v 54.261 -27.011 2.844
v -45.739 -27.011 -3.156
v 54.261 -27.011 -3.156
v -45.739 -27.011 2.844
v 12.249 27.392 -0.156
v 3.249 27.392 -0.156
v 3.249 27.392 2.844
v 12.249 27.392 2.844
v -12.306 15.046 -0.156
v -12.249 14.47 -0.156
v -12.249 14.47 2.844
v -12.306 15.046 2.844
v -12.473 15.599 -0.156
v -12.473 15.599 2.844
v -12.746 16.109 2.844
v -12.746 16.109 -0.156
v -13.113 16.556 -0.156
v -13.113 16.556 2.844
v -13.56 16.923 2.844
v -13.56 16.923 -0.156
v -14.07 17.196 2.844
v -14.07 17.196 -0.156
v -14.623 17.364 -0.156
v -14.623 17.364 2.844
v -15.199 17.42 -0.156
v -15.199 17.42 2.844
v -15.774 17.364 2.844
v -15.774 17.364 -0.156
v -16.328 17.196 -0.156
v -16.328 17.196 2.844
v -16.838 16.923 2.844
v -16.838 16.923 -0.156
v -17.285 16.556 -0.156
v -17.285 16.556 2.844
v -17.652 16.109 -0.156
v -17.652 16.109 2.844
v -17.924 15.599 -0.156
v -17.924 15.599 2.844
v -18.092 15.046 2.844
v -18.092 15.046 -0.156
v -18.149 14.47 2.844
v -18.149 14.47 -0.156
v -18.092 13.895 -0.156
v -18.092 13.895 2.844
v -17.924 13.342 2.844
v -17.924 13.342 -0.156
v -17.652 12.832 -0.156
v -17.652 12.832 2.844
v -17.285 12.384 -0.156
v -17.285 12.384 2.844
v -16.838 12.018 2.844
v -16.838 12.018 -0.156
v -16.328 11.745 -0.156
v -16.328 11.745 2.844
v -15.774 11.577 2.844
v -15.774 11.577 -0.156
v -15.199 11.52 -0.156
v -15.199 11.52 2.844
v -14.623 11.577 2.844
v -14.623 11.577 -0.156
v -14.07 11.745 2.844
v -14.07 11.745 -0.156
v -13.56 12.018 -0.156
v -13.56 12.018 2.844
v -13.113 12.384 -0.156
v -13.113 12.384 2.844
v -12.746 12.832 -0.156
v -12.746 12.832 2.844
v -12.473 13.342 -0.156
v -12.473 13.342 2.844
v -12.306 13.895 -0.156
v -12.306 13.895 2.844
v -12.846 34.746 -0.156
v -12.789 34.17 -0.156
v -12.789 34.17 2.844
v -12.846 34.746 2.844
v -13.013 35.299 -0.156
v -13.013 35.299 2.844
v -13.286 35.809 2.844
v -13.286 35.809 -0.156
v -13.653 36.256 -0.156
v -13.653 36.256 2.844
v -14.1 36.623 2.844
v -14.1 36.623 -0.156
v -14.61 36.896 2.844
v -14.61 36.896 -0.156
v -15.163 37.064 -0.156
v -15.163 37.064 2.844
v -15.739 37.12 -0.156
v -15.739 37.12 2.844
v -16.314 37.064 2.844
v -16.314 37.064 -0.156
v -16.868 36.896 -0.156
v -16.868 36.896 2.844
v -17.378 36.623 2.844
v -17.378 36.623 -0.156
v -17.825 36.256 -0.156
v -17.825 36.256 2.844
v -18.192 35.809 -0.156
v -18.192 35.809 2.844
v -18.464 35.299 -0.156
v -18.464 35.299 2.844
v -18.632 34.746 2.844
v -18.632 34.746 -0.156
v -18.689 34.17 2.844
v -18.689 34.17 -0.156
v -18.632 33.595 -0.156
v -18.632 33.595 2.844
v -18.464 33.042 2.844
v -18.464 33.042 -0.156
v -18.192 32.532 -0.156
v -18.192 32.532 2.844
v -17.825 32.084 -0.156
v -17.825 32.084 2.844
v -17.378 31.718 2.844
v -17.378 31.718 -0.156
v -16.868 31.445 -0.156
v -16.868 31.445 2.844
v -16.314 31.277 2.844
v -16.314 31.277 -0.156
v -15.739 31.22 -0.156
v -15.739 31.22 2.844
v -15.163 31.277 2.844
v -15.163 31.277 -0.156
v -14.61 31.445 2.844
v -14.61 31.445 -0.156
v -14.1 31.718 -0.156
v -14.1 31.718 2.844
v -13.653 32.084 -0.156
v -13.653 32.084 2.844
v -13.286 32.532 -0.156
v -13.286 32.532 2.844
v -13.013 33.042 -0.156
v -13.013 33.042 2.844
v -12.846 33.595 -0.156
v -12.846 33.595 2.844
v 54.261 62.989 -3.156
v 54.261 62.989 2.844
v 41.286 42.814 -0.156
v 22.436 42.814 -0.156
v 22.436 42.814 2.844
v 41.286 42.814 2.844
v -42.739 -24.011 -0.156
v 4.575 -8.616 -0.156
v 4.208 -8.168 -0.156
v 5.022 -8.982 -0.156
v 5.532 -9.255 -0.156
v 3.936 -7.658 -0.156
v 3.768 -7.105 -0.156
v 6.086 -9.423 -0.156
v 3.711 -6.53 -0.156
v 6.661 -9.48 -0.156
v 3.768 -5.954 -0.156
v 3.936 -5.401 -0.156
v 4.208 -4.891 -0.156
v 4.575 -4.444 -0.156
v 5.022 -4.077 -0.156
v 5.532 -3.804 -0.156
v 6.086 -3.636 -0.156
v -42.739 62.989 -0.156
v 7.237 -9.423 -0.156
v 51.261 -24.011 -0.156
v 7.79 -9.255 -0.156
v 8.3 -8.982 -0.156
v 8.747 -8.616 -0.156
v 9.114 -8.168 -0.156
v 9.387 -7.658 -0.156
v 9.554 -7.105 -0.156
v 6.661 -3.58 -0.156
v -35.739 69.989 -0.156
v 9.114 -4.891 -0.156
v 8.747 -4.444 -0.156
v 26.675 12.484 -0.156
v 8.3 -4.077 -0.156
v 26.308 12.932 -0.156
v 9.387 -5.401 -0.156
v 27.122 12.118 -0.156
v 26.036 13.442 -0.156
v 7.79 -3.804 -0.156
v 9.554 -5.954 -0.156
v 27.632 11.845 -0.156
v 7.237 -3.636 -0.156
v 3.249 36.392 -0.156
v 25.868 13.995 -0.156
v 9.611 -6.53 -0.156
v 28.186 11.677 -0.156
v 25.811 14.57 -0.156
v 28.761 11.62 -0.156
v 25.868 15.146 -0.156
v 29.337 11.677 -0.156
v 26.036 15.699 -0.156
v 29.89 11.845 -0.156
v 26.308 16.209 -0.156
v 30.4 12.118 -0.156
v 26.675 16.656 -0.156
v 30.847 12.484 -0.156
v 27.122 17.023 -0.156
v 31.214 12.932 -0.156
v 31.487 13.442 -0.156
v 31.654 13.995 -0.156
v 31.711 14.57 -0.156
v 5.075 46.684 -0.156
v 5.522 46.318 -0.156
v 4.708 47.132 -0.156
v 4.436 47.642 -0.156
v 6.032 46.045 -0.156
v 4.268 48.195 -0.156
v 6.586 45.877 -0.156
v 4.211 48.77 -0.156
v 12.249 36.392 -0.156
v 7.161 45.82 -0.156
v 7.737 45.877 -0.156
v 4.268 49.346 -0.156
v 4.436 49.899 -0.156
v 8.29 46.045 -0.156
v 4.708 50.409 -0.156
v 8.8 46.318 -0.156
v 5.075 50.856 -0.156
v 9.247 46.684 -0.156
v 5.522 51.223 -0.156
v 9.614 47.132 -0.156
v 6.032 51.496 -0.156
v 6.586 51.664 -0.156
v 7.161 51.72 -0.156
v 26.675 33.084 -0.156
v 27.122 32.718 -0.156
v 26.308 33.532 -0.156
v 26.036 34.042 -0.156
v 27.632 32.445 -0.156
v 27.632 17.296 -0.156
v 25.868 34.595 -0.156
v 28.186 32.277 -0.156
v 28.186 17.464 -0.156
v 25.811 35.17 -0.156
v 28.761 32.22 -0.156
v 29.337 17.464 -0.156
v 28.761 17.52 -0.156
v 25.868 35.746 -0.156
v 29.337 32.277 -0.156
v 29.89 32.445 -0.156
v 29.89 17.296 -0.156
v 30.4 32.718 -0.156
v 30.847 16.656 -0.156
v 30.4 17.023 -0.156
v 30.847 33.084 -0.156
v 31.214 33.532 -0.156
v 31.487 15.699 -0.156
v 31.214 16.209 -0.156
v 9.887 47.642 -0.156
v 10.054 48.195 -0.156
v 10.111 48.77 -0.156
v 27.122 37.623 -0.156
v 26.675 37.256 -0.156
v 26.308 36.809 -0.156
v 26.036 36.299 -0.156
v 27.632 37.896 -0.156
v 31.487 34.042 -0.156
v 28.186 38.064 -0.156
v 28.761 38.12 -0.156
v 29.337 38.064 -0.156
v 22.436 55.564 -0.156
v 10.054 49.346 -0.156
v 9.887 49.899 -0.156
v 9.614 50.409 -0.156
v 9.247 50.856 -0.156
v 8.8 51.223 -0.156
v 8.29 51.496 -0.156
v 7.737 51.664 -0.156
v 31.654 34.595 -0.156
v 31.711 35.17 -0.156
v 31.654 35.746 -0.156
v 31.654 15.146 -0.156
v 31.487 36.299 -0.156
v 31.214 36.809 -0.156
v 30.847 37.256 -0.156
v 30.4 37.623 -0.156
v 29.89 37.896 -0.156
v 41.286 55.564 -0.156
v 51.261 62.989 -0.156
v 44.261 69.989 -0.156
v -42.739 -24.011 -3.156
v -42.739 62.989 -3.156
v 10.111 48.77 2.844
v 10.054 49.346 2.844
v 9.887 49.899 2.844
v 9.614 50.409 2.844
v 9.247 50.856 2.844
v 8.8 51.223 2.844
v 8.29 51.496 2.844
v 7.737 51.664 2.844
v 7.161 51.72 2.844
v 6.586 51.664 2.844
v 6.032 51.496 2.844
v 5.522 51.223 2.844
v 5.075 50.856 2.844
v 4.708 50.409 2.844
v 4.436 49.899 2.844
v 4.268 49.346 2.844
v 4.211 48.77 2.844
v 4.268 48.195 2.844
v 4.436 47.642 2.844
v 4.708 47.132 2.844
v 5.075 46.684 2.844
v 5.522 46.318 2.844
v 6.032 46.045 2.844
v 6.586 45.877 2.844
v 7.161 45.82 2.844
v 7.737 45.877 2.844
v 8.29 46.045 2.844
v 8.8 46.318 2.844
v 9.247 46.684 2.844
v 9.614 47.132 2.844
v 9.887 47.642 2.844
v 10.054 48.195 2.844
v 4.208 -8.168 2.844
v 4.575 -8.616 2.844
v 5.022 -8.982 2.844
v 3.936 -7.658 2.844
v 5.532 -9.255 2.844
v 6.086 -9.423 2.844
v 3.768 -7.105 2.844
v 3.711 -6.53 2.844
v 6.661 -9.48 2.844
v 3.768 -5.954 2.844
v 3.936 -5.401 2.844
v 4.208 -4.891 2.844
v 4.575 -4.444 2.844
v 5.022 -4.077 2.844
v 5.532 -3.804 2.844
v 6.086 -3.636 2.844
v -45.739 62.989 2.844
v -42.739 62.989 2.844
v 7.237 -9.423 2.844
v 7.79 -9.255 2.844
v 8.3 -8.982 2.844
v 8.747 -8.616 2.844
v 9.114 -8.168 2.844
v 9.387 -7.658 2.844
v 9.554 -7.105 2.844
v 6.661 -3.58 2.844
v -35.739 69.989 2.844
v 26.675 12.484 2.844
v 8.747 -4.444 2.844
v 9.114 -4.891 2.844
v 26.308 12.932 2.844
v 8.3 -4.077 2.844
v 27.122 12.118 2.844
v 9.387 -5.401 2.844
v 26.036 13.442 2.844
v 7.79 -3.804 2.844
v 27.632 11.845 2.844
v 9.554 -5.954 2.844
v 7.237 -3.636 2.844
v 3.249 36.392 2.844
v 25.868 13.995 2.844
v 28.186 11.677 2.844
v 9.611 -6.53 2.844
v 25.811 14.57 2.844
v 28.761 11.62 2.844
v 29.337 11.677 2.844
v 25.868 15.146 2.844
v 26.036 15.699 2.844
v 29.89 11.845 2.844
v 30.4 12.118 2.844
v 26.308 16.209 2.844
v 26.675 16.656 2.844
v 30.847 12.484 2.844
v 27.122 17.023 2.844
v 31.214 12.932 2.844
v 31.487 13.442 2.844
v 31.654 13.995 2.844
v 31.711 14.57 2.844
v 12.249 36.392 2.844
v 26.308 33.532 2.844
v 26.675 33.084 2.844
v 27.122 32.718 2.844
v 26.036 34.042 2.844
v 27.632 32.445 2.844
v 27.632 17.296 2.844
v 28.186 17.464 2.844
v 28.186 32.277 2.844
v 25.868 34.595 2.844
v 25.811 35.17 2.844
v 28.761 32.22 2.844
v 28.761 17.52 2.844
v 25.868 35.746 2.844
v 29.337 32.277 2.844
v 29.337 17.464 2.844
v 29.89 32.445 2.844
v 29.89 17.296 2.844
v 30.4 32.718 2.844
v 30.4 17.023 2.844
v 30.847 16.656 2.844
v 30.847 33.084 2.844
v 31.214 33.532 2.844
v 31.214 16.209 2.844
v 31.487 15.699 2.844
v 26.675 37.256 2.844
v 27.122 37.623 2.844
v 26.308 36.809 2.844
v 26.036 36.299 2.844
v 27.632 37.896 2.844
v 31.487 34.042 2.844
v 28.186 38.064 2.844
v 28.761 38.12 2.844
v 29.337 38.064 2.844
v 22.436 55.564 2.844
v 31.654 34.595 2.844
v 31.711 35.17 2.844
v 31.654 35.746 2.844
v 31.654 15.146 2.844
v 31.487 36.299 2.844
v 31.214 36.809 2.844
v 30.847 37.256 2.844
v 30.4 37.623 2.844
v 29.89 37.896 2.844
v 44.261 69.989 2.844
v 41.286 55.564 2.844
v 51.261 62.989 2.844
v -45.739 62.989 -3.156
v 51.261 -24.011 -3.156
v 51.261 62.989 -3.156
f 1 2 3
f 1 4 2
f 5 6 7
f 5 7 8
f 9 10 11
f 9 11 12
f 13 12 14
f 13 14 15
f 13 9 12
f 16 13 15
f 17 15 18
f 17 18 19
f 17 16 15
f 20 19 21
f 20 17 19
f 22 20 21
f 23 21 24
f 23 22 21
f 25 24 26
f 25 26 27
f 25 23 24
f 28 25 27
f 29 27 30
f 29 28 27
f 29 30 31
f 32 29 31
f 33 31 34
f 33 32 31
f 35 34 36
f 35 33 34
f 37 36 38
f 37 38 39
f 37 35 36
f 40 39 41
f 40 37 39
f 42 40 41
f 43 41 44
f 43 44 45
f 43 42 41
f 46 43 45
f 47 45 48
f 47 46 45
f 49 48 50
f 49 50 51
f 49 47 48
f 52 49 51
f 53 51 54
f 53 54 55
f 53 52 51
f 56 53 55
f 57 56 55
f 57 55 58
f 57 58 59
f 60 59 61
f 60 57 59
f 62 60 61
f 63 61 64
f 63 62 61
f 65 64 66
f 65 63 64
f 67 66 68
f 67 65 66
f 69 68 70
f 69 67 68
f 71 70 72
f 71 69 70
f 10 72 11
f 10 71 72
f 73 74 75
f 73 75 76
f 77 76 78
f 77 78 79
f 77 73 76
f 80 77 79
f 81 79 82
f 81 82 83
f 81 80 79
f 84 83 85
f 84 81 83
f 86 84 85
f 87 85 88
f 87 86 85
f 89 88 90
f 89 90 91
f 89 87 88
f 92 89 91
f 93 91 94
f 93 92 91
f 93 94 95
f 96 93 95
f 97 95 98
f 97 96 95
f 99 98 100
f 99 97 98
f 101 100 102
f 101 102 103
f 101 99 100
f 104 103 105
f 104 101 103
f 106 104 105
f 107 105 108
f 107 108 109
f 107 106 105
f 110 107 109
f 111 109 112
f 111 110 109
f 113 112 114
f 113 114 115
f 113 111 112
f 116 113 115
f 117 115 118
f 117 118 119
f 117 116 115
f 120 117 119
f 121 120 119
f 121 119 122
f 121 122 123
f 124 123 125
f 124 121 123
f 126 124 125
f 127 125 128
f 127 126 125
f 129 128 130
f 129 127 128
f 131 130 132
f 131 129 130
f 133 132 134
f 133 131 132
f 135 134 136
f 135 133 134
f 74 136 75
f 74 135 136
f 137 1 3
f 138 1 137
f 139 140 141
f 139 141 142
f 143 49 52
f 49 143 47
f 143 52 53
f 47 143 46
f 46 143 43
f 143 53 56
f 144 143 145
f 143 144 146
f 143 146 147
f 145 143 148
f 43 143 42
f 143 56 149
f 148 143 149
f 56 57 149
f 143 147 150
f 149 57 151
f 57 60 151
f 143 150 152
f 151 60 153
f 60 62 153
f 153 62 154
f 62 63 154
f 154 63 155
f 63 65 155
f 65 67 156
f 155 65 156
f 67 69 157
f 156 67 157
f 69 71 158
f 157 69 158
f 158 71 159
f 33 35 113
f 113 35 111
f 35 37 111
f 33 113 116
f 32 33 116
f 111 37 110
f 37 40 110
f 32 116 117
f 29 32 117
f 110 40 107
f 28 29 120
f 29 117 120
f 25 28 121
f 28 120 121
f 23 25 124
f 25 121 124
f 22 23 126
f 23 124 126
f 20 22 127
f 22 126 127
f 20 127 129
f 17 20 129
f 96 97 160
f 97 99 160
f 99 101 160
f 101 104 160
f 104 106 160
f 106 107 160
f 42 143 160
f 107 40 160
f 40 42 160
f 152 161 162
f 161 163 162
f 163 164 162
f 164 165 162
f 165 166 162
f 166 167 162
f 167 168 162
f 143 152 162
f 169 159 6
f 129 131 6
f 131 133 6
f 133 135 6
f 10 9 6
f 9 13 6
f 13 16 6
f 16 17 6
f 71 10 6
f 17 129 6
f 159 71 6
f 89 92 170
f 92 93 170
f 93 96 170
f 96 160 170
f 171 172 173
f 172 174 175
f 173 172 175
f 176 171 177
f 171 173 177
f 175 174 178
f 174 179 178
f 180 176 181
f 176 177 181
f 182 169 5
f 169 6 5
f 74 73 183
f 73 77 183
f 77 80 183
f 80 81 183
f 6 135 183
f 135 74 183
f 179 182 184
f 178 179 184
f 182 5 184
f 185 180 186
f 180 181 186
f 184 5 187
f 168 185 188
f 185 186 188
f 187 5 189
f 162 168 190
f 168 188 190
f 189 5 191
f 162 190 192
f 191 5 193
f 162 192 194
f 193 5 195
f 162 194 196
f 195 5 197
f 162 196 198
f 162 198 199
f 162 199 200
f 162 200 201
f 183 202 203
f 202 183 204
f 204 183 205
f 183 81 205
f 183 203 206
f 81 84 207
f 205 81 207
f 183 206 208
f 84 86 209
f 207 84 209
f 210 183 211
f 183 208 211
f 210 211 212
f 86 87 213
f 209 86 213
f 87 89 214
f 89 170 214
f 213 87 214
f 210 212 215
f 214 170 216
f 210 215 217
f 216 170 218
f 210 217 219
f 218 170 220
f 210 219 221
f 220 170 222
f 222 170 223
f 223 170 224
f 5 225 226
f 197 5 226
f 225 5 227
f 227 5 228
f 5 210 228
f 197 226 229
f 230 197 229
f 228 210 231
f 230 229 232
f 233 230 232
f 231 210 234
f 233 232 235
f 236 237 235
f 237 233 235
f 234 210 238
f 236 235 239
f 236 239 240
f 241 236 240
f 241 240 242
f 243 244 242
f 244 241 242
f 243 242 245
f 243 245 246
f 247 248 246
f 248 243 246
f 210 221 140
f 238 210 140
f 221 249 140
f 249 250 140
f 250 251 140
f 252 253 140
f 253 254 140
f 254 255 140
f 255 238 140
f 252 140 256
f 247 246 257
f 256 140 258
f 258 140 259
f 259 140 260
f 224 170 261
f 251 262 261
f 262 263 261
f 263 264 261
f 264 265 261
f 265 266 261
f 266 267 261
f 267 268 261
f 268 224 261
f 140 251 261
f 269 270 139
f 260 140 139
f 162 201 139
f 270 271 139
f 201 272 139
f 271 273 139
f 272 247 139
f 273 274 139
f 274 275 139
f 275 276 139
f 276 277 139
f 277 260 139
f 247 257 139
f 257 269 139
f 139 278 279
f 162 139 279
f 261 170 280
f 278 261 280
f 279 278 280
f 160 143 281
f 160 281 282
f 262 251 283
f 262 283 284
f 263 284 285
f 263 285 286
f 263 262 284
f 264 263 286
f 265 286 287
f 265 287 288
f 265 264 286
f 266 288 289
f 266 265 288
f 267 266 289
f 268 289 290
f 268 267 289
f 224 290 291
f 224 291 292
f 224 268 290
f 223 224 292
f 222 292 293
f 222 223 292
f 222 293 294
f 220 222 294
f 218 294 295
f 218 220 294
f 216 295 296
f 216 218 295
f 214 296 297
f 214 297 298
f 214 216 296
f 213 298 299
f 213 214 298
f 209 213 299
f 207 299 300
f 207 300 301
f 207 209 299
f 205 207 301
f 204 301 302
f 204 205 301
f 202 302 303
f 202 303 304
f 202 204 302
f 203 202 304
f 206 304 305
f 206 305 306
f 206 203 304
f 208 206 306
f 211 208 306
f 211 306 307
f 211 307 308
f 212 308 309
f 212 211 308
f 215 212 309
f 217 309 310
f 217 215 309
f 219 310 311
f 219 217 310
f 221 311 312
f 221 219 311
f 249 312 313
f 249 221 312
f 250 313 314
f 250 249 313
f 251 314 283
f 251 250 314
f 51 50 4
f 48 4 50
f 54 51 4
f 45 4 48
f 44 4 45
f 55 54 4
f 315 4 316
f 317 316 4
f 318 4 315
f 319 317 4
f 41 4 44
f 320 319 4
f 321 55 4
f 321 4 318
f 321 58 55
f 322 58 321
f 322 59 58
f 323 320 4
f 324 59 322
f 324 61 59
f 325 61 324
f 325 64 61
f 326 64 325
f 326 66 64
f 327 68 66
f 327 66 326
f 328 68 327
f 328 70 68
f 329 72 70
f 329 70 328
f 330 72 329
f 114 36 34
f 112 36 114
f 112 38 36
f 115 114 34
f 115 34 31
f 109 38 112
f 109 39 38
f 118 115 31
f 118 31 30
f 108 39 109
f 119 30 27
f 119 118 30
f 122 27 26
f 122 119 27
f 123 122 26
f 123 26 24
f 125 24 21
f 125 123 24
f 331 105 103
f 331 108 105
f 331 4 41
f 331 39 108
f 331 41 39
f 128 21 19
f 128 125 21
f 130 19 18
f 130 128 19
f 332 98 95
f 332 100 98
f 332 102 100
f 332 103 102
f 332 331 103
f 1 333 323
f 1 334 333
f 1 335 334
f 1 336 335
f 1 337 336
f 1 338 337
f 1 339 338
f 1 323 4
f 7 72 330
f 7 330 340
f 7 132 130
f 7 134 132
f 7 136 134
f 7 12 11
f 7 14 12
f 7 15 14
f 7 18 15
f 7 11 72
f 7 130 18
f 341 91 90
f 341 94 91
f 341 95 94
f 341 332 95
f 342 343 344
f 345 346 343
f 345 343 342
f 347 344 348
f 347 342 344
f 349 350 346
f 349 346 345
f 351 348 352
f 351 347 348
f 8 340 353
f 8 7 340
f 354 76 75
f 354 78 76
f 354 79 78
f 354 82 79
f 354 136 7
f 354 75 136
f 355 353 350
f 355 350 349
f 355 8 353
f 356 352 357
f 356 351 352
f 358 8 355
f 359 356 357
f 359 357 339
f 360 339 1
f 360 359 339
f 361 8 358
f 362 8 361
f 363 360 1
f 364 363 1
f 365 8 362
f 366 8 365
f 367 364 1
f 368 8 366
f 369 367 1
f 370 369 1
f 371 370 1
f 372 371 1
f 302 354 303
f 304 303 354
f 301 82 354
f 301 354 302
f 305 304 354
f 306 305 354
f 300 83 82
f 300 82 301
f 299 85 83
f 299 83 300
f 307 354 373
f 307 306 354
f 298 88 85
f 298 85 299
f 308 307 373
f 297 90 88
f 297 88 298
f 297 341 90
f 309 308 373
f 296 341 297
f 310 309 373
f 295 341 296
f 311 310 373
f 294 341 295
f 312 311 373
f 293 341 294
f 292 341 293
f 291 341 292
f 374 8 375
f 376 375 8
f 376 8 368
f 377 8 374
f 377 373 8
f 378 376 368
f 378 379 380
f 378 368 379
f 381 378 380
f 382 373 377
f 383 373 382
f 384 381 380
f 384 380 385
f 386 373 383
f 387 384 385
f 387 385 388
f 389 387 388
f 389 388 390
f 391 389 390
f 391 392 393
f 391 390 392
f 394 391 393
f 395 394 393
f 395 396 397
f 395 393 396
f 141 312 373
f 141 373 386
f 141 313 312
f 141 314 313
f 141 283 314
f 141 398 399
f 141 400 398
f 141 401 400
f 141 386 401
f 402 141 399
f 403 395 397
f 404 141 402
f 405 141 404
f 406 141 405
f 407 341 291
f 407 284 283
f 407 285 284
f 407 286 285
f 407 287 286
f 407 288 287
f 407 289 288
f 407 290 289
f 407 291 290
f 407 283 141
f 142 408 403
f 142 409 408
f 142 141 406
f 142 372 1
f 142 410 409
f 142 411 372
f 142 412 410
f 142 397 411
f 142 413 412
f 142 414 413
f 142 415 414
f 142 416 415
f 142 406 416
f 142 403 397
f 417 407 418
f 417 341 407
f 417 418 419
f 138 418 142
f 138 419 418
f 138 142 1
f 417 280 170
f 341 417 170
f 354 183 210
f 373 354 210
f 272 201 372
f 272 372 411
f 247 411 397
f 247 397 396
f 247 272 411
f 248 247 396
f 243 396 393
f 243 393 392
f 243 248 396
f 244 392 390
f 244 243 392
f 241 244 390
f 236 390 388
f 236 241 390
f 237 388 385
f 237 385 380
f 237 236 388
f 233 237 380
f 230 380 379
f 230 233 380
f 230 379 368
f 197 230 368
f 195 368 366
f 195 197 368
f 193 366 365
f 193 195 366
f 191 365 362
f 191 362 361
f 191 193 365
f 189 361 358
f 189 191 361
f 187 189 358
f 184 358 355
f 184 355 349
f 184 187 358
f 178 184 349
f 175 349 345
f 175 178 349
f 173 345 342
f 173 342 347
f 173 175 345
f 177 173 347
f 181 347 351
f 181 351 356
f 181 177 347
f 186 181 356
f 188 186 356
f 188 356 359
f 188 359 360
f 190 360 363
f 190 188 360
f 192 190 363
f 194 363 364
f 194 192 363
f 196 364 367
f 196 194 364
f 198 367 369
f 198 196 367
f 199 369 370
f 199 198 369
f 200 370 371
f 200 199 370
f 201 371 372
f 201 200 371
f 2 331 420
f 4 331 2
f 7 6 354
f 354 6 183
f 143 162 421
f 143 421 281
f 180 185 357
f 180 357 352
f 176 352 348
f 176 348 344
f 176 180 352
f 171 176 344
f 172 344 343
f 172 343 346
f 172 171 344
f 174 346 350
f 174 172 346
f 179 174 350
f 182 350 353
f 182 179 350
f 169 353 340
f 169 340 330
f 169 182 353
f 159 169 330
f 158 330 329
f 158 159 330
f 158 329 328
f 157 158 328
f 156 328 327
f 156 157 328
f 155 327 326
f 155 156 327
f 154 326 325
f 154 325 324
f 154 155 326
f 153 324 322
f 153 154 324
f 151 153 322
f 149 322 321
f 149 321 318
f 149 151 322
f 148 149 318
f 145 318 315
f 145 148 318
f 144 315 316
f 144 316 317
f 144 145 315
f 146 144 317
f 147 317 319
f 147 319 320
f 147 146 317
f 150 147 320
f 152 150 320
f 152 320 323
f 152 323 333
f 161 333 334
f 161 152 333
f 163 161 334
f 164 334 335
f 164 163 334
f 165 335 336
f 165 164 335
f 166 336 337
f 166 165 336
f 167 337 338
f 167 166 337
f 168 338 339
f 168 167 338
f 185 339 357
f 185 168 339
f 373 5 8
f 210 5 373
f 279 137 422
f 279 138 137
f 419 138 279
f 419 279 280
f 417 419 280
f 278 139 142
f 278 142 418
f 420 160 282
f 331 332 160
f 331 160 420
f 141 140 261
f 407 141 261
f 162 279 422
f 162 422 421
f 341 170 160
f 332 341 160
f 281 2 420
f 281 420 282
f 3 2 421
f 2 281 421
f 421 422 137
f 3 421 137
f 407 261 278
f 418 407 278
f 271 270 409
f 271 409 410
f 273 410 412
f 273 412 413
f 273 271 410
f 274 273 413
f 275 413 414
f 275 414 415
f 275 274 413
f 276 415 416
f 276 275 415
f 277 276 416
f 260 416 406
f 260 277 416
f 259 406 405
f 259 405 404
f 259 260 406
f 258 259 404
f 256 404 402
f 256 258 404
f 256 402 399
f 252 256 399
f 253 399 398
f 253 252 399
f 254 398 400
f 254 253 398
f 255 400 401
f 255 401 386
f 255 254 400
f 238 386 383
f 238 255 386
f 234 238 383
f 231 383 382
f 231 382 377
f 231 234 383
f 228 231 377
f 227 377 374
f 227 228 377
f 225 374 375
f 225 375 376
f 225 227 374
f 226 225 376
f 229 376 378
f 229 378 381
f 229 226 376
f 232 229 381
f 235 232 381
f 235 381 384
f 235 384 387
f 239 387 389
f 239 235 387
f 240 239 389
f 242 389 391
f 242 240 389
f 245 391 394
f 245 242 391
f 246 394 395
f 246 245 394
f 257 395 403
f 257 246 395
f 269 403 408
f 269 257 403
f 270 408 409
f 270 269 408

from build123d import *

# Parameters (mm, degrees)
CROQUIS1_R              = 2.950001172
CROQUIS1_W              = 9
CROQUIS1_H              = 9
CROQUIS1_W_2            = 18.849999644
CROQUIS1_H_2            = 12.749999762
SALIENTE_EXTRUIR1_DEPTH = 3
SALIENTE_EXTRUIR6_DEPTH = 3


with BuildPart() as part:
    # Croquis1 → Saliente-Extruir1 (new body)
    with BuildSketch(Plane.XY.offset(-0.156260387)):
        Polygon((51.261125499, 62.988673094), (44.261125499, 69.988673094), (-35.738874501, 69.988673094), (-42.738874501, 62.988673094), (-45.738874501, 62.988673094), (-45.738874501, -27.011326906), (54.261125499, -27.011326906), (54.261125499, 62.988673094), align=None)
        with Locations((7.161124531, 48.770443145)):
            Circle(CROQUIS1_R, mode=Mode.SUBTRACT)
        with Locations((28.761125092, 35.170443896)):
            Circle(CROQUIS1_R, mode=Mode.SUBTRACT)
        with Locations((28.761125092, 14.5704435)):
            Circle(CROQUIS1_R, mode=Mode.SUBTRACT)
        with Locations((6.661127243, -6.529559074)):
            Circle(CROQUIS1_R, mode=Mode.SUBTRACT)
        with Locations((-15.198872503, 14.470443669)):
            Circle(CROQUIS1_R, mode=Mode.SUBTRACT)
        with Locations((-15.738875683, 34.170445595)):
            Circle(CROQUIS1_R, mode=Mode.SUBTRACT)
        with Locations((7.748576734, 31.892113927)):
            Rectangle(CROQUIS1_W, CROQUIS1_H, mode=Mode.SUBTRACT)
        with Locations((31.861125879, 49.188674036)):
            Rectangle(CROQUIS1_W_2, CROQUIS1_H_2, mode=Mode.SUBTRACT)
    extrude(amount=SALIENTE_EXTRUIR1_DEPTH)

    # Croquis9 → Saliente-Extruir6 (add)
    with BuildSketch(Plane(origin=(0, 0, -0.156260387), x_dir=(-1, 0, 0), z_dir=(0, 0, -1))):
        Polygon((-54.261125499, 62.988673094), (-51.261125499, 62.988673094), (-51.261125499, -24.011326906), (42.738874501, -24.011326906), (42.738874501, 62.988673094), (45.738874501, 62.988673094), (45.738874501, -27.011326906), (-54.261125499, -27.011326906), align=None)
    extrude(amount=SALIENTE_EXTRUIR6_DEPTH)


solid = part.part
